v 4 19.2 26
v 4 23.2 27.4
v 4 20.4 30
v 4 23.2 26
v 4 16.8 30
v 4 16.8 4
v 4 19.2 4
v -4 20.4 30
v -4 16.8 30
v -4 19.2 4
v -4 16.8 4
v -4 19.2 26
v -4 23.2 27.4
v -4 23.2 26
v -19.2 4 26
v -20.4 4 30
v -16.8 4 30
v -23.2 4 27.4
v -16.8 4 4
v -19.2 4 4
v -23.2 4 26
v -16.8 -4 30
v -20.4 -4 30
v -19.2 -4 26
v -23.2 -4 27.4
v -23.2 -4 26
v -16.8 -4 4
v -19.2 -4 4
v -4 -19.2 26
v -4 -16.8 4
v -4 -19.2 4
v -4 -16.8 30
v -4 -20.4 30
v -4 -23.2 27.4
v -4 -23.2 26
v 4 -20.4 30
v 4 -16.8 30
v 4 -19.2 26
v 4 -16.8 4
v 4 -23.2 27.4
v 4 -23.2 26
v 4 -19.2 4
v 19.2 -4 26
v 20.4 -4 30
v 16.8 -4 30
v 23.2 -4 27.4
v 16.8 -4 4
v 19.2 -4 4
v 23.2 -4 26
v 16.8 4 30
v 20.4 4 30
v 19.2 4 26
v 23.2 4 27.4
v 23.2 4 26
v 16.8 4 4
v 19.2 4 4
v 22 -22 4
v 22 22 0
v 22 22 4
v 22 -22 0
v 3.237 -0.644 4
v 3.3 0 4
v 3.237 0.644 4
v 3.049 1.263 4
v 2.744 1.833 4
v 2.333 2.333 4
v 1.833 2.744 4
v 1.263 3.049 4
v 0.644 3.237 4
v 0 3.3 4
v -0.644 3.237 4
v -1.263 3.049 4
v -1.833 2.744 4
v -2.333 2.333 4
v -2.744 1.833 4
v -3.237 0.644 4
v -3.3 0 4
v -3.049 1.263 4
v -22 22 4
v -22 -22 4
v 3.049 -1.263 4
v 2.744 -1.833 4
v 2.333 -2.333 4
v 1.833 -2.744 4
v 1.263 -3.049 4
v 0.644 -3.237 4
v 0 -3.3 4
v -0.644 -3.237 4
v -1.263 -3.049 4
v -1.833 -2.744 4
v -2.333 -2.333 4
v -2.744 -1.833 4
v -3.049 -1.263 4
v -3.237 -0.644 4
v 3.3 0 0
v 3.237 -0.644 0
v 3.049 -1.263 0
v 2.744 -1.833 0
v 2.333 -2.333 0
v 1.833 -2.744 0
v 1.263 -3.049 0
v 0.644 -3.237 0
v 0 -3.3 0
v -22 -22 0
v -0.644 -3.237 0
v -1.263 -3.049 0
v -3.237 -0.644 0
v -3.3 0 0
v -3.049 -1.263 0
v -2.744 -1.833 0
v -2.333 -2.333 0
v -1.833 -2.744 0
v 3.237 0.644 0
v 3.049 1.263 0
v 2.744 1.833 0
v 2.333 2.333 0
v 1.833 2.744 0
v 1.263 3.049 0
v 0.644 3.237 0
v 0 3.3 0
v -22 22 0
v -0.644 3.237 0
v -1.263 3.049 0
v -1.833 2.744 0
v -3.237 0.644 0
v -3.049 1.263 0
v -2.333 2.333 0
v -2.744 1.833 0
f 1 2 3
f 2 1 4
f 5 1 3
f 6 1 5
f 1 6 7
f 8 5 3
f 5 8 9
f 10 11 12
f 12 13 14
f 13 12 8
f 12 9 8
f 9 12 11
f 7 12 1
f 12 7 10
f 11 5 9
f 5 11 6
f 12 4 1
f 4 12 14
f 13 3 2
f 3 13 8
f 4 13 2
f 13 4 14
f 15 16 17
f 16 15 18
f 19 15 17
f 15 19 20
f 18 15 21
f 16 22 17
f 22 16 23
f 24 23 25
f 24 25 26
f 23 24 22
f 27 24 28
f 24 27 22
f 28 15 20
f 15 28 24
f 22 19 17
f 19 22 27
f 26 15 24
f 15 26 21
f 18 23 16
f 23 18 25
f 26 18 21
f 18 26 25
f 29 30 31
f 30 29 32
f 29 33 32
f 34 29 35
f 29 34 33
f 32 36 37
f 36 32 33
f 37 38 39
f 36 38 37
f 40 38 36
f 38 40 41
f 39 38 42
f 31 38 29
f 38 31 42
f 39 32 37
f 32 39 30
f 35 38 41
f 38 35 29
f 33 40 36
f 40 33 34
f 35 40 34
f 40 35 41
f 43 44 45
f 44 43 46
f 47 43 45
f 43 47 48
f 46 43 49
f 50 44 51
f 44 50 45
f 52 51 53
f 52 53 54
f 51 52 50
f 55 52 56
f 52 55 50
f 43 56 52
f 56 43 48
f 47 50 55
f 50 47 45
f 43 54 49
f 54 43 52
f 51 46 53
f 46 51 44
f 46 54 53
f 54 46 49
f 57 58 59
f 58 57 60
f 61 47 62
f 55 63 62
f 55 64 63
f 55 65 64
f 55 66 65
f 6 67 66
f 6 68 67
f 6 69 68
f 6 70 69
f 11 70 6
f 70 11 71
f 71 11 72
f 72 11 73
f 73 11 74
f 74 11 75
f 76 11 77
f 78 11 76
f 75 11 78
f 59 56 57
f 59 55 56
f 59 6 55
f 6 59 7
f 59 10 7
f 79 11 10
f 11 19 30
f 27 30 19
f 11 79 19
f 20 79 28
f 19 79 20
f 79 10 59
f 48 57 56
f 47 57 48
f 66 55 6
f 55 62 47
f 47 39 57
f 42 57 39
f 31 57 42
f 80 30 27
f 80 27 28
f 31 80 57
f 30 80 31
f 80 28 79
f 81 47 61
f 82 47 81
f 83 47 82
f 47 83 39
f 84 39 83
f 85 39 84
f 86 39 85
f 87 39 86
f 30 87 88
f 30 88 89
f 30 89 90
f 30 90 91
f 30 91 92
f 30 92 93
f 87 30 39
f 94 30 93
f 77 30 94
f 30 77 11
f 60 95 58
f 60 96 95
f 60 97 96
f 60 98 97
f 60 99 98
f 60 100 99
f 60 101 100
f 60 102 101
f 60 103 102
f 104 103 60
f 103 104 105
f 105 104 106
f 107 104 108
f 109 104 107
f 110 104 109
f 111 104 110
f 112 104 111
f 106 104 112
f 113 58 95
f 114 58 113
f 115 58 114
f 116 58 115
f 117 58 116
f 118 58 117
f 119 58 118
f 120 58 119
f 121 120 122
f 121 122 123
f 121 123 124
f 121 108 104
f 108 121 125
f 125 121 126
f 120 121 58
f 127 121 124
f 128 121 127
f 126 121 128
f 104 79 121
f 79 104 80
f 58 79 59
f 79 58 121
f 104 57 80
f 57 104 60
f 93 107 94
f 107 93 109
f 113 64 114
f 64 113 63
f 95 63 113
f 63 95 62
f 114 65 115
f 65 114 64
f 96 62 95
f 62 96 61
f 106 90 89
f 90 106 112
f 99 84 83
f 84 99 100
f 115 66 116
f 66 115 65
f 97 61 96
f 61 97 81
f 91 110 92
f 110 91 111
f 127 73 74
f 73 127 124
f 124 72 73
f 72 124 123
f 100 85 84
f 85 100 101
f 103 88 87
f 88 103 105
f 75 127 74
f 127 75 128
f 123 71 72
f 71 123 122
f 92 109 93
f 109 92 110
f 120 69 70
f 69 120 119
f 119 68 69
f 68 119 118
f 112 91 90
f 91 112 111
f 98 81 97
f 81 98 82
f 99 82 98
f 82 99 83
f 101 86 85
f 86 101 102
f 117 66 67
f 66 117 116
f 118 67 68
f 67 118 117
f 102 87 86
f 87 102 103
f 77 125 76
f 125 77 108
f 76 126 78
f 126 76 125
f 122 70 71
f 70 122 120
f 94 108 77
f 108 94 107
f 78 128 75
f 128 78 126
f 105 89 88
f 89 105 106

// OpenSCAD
$fn = 32;

// ----------------------------------------------------------------------
// Snap-fit latch: 4 arms, 26 mm tall, 4.2 mm undercut hooks
// ----------------------------------------------------------------------

// --- parameters (mm) ---
base_d = 44;              // base plate depth
base_h = 4;               // base plate thickness
span = 36;                // distance between opposite arms
arm_t = 2.4;              // arm thickness
arm_d = 8;                // arm width
height = 26;              // free arm length
head_len = 4.2;           // hook reach
head_h = 4;               // hook height
lead = 1.4;               // lead-in ramp thickness
bore_d = 6.6;             // base fixing bore
top_z = 30;               // height of the arm tips above the base

arms = 4;

difference() {
  union() {
    /* base plate, centred on the arm ring */
    translate([-22, -22, 0]) cube([base_d, base_d, base_h]);
    for (a = [0 : 360 / arms : 359]) rotate([0, 0, a]) {
    /* arm, sunk 0.5 mm into the base */
    translate([-arm_d / 2, span / 2 - arm_t / 2, base_h - 0.5]) cube([arm_d, arm_t, height + 0.5]);
    /* hook: a convex hull of a tall inner block and a thin outer lip
       gives a flat undercut below and a lead-in ramp on top */
    hull() {
      translate([-arm_d / 2, span / 2 + arm_t / 2 - 0.6, top_z - head_h]) cube([arm_d, lead + 0.4, head_h]);
      translate([-arm_d / 2, span / 2 + arm_t / 2 - 0.2, top_z - head_h]) cube([arm_d, head_len, lead]);
    }
    }
  }
  translate([0, 0, -2.5]) cylinder(h = base_h + 5, d = bore_d);
}
